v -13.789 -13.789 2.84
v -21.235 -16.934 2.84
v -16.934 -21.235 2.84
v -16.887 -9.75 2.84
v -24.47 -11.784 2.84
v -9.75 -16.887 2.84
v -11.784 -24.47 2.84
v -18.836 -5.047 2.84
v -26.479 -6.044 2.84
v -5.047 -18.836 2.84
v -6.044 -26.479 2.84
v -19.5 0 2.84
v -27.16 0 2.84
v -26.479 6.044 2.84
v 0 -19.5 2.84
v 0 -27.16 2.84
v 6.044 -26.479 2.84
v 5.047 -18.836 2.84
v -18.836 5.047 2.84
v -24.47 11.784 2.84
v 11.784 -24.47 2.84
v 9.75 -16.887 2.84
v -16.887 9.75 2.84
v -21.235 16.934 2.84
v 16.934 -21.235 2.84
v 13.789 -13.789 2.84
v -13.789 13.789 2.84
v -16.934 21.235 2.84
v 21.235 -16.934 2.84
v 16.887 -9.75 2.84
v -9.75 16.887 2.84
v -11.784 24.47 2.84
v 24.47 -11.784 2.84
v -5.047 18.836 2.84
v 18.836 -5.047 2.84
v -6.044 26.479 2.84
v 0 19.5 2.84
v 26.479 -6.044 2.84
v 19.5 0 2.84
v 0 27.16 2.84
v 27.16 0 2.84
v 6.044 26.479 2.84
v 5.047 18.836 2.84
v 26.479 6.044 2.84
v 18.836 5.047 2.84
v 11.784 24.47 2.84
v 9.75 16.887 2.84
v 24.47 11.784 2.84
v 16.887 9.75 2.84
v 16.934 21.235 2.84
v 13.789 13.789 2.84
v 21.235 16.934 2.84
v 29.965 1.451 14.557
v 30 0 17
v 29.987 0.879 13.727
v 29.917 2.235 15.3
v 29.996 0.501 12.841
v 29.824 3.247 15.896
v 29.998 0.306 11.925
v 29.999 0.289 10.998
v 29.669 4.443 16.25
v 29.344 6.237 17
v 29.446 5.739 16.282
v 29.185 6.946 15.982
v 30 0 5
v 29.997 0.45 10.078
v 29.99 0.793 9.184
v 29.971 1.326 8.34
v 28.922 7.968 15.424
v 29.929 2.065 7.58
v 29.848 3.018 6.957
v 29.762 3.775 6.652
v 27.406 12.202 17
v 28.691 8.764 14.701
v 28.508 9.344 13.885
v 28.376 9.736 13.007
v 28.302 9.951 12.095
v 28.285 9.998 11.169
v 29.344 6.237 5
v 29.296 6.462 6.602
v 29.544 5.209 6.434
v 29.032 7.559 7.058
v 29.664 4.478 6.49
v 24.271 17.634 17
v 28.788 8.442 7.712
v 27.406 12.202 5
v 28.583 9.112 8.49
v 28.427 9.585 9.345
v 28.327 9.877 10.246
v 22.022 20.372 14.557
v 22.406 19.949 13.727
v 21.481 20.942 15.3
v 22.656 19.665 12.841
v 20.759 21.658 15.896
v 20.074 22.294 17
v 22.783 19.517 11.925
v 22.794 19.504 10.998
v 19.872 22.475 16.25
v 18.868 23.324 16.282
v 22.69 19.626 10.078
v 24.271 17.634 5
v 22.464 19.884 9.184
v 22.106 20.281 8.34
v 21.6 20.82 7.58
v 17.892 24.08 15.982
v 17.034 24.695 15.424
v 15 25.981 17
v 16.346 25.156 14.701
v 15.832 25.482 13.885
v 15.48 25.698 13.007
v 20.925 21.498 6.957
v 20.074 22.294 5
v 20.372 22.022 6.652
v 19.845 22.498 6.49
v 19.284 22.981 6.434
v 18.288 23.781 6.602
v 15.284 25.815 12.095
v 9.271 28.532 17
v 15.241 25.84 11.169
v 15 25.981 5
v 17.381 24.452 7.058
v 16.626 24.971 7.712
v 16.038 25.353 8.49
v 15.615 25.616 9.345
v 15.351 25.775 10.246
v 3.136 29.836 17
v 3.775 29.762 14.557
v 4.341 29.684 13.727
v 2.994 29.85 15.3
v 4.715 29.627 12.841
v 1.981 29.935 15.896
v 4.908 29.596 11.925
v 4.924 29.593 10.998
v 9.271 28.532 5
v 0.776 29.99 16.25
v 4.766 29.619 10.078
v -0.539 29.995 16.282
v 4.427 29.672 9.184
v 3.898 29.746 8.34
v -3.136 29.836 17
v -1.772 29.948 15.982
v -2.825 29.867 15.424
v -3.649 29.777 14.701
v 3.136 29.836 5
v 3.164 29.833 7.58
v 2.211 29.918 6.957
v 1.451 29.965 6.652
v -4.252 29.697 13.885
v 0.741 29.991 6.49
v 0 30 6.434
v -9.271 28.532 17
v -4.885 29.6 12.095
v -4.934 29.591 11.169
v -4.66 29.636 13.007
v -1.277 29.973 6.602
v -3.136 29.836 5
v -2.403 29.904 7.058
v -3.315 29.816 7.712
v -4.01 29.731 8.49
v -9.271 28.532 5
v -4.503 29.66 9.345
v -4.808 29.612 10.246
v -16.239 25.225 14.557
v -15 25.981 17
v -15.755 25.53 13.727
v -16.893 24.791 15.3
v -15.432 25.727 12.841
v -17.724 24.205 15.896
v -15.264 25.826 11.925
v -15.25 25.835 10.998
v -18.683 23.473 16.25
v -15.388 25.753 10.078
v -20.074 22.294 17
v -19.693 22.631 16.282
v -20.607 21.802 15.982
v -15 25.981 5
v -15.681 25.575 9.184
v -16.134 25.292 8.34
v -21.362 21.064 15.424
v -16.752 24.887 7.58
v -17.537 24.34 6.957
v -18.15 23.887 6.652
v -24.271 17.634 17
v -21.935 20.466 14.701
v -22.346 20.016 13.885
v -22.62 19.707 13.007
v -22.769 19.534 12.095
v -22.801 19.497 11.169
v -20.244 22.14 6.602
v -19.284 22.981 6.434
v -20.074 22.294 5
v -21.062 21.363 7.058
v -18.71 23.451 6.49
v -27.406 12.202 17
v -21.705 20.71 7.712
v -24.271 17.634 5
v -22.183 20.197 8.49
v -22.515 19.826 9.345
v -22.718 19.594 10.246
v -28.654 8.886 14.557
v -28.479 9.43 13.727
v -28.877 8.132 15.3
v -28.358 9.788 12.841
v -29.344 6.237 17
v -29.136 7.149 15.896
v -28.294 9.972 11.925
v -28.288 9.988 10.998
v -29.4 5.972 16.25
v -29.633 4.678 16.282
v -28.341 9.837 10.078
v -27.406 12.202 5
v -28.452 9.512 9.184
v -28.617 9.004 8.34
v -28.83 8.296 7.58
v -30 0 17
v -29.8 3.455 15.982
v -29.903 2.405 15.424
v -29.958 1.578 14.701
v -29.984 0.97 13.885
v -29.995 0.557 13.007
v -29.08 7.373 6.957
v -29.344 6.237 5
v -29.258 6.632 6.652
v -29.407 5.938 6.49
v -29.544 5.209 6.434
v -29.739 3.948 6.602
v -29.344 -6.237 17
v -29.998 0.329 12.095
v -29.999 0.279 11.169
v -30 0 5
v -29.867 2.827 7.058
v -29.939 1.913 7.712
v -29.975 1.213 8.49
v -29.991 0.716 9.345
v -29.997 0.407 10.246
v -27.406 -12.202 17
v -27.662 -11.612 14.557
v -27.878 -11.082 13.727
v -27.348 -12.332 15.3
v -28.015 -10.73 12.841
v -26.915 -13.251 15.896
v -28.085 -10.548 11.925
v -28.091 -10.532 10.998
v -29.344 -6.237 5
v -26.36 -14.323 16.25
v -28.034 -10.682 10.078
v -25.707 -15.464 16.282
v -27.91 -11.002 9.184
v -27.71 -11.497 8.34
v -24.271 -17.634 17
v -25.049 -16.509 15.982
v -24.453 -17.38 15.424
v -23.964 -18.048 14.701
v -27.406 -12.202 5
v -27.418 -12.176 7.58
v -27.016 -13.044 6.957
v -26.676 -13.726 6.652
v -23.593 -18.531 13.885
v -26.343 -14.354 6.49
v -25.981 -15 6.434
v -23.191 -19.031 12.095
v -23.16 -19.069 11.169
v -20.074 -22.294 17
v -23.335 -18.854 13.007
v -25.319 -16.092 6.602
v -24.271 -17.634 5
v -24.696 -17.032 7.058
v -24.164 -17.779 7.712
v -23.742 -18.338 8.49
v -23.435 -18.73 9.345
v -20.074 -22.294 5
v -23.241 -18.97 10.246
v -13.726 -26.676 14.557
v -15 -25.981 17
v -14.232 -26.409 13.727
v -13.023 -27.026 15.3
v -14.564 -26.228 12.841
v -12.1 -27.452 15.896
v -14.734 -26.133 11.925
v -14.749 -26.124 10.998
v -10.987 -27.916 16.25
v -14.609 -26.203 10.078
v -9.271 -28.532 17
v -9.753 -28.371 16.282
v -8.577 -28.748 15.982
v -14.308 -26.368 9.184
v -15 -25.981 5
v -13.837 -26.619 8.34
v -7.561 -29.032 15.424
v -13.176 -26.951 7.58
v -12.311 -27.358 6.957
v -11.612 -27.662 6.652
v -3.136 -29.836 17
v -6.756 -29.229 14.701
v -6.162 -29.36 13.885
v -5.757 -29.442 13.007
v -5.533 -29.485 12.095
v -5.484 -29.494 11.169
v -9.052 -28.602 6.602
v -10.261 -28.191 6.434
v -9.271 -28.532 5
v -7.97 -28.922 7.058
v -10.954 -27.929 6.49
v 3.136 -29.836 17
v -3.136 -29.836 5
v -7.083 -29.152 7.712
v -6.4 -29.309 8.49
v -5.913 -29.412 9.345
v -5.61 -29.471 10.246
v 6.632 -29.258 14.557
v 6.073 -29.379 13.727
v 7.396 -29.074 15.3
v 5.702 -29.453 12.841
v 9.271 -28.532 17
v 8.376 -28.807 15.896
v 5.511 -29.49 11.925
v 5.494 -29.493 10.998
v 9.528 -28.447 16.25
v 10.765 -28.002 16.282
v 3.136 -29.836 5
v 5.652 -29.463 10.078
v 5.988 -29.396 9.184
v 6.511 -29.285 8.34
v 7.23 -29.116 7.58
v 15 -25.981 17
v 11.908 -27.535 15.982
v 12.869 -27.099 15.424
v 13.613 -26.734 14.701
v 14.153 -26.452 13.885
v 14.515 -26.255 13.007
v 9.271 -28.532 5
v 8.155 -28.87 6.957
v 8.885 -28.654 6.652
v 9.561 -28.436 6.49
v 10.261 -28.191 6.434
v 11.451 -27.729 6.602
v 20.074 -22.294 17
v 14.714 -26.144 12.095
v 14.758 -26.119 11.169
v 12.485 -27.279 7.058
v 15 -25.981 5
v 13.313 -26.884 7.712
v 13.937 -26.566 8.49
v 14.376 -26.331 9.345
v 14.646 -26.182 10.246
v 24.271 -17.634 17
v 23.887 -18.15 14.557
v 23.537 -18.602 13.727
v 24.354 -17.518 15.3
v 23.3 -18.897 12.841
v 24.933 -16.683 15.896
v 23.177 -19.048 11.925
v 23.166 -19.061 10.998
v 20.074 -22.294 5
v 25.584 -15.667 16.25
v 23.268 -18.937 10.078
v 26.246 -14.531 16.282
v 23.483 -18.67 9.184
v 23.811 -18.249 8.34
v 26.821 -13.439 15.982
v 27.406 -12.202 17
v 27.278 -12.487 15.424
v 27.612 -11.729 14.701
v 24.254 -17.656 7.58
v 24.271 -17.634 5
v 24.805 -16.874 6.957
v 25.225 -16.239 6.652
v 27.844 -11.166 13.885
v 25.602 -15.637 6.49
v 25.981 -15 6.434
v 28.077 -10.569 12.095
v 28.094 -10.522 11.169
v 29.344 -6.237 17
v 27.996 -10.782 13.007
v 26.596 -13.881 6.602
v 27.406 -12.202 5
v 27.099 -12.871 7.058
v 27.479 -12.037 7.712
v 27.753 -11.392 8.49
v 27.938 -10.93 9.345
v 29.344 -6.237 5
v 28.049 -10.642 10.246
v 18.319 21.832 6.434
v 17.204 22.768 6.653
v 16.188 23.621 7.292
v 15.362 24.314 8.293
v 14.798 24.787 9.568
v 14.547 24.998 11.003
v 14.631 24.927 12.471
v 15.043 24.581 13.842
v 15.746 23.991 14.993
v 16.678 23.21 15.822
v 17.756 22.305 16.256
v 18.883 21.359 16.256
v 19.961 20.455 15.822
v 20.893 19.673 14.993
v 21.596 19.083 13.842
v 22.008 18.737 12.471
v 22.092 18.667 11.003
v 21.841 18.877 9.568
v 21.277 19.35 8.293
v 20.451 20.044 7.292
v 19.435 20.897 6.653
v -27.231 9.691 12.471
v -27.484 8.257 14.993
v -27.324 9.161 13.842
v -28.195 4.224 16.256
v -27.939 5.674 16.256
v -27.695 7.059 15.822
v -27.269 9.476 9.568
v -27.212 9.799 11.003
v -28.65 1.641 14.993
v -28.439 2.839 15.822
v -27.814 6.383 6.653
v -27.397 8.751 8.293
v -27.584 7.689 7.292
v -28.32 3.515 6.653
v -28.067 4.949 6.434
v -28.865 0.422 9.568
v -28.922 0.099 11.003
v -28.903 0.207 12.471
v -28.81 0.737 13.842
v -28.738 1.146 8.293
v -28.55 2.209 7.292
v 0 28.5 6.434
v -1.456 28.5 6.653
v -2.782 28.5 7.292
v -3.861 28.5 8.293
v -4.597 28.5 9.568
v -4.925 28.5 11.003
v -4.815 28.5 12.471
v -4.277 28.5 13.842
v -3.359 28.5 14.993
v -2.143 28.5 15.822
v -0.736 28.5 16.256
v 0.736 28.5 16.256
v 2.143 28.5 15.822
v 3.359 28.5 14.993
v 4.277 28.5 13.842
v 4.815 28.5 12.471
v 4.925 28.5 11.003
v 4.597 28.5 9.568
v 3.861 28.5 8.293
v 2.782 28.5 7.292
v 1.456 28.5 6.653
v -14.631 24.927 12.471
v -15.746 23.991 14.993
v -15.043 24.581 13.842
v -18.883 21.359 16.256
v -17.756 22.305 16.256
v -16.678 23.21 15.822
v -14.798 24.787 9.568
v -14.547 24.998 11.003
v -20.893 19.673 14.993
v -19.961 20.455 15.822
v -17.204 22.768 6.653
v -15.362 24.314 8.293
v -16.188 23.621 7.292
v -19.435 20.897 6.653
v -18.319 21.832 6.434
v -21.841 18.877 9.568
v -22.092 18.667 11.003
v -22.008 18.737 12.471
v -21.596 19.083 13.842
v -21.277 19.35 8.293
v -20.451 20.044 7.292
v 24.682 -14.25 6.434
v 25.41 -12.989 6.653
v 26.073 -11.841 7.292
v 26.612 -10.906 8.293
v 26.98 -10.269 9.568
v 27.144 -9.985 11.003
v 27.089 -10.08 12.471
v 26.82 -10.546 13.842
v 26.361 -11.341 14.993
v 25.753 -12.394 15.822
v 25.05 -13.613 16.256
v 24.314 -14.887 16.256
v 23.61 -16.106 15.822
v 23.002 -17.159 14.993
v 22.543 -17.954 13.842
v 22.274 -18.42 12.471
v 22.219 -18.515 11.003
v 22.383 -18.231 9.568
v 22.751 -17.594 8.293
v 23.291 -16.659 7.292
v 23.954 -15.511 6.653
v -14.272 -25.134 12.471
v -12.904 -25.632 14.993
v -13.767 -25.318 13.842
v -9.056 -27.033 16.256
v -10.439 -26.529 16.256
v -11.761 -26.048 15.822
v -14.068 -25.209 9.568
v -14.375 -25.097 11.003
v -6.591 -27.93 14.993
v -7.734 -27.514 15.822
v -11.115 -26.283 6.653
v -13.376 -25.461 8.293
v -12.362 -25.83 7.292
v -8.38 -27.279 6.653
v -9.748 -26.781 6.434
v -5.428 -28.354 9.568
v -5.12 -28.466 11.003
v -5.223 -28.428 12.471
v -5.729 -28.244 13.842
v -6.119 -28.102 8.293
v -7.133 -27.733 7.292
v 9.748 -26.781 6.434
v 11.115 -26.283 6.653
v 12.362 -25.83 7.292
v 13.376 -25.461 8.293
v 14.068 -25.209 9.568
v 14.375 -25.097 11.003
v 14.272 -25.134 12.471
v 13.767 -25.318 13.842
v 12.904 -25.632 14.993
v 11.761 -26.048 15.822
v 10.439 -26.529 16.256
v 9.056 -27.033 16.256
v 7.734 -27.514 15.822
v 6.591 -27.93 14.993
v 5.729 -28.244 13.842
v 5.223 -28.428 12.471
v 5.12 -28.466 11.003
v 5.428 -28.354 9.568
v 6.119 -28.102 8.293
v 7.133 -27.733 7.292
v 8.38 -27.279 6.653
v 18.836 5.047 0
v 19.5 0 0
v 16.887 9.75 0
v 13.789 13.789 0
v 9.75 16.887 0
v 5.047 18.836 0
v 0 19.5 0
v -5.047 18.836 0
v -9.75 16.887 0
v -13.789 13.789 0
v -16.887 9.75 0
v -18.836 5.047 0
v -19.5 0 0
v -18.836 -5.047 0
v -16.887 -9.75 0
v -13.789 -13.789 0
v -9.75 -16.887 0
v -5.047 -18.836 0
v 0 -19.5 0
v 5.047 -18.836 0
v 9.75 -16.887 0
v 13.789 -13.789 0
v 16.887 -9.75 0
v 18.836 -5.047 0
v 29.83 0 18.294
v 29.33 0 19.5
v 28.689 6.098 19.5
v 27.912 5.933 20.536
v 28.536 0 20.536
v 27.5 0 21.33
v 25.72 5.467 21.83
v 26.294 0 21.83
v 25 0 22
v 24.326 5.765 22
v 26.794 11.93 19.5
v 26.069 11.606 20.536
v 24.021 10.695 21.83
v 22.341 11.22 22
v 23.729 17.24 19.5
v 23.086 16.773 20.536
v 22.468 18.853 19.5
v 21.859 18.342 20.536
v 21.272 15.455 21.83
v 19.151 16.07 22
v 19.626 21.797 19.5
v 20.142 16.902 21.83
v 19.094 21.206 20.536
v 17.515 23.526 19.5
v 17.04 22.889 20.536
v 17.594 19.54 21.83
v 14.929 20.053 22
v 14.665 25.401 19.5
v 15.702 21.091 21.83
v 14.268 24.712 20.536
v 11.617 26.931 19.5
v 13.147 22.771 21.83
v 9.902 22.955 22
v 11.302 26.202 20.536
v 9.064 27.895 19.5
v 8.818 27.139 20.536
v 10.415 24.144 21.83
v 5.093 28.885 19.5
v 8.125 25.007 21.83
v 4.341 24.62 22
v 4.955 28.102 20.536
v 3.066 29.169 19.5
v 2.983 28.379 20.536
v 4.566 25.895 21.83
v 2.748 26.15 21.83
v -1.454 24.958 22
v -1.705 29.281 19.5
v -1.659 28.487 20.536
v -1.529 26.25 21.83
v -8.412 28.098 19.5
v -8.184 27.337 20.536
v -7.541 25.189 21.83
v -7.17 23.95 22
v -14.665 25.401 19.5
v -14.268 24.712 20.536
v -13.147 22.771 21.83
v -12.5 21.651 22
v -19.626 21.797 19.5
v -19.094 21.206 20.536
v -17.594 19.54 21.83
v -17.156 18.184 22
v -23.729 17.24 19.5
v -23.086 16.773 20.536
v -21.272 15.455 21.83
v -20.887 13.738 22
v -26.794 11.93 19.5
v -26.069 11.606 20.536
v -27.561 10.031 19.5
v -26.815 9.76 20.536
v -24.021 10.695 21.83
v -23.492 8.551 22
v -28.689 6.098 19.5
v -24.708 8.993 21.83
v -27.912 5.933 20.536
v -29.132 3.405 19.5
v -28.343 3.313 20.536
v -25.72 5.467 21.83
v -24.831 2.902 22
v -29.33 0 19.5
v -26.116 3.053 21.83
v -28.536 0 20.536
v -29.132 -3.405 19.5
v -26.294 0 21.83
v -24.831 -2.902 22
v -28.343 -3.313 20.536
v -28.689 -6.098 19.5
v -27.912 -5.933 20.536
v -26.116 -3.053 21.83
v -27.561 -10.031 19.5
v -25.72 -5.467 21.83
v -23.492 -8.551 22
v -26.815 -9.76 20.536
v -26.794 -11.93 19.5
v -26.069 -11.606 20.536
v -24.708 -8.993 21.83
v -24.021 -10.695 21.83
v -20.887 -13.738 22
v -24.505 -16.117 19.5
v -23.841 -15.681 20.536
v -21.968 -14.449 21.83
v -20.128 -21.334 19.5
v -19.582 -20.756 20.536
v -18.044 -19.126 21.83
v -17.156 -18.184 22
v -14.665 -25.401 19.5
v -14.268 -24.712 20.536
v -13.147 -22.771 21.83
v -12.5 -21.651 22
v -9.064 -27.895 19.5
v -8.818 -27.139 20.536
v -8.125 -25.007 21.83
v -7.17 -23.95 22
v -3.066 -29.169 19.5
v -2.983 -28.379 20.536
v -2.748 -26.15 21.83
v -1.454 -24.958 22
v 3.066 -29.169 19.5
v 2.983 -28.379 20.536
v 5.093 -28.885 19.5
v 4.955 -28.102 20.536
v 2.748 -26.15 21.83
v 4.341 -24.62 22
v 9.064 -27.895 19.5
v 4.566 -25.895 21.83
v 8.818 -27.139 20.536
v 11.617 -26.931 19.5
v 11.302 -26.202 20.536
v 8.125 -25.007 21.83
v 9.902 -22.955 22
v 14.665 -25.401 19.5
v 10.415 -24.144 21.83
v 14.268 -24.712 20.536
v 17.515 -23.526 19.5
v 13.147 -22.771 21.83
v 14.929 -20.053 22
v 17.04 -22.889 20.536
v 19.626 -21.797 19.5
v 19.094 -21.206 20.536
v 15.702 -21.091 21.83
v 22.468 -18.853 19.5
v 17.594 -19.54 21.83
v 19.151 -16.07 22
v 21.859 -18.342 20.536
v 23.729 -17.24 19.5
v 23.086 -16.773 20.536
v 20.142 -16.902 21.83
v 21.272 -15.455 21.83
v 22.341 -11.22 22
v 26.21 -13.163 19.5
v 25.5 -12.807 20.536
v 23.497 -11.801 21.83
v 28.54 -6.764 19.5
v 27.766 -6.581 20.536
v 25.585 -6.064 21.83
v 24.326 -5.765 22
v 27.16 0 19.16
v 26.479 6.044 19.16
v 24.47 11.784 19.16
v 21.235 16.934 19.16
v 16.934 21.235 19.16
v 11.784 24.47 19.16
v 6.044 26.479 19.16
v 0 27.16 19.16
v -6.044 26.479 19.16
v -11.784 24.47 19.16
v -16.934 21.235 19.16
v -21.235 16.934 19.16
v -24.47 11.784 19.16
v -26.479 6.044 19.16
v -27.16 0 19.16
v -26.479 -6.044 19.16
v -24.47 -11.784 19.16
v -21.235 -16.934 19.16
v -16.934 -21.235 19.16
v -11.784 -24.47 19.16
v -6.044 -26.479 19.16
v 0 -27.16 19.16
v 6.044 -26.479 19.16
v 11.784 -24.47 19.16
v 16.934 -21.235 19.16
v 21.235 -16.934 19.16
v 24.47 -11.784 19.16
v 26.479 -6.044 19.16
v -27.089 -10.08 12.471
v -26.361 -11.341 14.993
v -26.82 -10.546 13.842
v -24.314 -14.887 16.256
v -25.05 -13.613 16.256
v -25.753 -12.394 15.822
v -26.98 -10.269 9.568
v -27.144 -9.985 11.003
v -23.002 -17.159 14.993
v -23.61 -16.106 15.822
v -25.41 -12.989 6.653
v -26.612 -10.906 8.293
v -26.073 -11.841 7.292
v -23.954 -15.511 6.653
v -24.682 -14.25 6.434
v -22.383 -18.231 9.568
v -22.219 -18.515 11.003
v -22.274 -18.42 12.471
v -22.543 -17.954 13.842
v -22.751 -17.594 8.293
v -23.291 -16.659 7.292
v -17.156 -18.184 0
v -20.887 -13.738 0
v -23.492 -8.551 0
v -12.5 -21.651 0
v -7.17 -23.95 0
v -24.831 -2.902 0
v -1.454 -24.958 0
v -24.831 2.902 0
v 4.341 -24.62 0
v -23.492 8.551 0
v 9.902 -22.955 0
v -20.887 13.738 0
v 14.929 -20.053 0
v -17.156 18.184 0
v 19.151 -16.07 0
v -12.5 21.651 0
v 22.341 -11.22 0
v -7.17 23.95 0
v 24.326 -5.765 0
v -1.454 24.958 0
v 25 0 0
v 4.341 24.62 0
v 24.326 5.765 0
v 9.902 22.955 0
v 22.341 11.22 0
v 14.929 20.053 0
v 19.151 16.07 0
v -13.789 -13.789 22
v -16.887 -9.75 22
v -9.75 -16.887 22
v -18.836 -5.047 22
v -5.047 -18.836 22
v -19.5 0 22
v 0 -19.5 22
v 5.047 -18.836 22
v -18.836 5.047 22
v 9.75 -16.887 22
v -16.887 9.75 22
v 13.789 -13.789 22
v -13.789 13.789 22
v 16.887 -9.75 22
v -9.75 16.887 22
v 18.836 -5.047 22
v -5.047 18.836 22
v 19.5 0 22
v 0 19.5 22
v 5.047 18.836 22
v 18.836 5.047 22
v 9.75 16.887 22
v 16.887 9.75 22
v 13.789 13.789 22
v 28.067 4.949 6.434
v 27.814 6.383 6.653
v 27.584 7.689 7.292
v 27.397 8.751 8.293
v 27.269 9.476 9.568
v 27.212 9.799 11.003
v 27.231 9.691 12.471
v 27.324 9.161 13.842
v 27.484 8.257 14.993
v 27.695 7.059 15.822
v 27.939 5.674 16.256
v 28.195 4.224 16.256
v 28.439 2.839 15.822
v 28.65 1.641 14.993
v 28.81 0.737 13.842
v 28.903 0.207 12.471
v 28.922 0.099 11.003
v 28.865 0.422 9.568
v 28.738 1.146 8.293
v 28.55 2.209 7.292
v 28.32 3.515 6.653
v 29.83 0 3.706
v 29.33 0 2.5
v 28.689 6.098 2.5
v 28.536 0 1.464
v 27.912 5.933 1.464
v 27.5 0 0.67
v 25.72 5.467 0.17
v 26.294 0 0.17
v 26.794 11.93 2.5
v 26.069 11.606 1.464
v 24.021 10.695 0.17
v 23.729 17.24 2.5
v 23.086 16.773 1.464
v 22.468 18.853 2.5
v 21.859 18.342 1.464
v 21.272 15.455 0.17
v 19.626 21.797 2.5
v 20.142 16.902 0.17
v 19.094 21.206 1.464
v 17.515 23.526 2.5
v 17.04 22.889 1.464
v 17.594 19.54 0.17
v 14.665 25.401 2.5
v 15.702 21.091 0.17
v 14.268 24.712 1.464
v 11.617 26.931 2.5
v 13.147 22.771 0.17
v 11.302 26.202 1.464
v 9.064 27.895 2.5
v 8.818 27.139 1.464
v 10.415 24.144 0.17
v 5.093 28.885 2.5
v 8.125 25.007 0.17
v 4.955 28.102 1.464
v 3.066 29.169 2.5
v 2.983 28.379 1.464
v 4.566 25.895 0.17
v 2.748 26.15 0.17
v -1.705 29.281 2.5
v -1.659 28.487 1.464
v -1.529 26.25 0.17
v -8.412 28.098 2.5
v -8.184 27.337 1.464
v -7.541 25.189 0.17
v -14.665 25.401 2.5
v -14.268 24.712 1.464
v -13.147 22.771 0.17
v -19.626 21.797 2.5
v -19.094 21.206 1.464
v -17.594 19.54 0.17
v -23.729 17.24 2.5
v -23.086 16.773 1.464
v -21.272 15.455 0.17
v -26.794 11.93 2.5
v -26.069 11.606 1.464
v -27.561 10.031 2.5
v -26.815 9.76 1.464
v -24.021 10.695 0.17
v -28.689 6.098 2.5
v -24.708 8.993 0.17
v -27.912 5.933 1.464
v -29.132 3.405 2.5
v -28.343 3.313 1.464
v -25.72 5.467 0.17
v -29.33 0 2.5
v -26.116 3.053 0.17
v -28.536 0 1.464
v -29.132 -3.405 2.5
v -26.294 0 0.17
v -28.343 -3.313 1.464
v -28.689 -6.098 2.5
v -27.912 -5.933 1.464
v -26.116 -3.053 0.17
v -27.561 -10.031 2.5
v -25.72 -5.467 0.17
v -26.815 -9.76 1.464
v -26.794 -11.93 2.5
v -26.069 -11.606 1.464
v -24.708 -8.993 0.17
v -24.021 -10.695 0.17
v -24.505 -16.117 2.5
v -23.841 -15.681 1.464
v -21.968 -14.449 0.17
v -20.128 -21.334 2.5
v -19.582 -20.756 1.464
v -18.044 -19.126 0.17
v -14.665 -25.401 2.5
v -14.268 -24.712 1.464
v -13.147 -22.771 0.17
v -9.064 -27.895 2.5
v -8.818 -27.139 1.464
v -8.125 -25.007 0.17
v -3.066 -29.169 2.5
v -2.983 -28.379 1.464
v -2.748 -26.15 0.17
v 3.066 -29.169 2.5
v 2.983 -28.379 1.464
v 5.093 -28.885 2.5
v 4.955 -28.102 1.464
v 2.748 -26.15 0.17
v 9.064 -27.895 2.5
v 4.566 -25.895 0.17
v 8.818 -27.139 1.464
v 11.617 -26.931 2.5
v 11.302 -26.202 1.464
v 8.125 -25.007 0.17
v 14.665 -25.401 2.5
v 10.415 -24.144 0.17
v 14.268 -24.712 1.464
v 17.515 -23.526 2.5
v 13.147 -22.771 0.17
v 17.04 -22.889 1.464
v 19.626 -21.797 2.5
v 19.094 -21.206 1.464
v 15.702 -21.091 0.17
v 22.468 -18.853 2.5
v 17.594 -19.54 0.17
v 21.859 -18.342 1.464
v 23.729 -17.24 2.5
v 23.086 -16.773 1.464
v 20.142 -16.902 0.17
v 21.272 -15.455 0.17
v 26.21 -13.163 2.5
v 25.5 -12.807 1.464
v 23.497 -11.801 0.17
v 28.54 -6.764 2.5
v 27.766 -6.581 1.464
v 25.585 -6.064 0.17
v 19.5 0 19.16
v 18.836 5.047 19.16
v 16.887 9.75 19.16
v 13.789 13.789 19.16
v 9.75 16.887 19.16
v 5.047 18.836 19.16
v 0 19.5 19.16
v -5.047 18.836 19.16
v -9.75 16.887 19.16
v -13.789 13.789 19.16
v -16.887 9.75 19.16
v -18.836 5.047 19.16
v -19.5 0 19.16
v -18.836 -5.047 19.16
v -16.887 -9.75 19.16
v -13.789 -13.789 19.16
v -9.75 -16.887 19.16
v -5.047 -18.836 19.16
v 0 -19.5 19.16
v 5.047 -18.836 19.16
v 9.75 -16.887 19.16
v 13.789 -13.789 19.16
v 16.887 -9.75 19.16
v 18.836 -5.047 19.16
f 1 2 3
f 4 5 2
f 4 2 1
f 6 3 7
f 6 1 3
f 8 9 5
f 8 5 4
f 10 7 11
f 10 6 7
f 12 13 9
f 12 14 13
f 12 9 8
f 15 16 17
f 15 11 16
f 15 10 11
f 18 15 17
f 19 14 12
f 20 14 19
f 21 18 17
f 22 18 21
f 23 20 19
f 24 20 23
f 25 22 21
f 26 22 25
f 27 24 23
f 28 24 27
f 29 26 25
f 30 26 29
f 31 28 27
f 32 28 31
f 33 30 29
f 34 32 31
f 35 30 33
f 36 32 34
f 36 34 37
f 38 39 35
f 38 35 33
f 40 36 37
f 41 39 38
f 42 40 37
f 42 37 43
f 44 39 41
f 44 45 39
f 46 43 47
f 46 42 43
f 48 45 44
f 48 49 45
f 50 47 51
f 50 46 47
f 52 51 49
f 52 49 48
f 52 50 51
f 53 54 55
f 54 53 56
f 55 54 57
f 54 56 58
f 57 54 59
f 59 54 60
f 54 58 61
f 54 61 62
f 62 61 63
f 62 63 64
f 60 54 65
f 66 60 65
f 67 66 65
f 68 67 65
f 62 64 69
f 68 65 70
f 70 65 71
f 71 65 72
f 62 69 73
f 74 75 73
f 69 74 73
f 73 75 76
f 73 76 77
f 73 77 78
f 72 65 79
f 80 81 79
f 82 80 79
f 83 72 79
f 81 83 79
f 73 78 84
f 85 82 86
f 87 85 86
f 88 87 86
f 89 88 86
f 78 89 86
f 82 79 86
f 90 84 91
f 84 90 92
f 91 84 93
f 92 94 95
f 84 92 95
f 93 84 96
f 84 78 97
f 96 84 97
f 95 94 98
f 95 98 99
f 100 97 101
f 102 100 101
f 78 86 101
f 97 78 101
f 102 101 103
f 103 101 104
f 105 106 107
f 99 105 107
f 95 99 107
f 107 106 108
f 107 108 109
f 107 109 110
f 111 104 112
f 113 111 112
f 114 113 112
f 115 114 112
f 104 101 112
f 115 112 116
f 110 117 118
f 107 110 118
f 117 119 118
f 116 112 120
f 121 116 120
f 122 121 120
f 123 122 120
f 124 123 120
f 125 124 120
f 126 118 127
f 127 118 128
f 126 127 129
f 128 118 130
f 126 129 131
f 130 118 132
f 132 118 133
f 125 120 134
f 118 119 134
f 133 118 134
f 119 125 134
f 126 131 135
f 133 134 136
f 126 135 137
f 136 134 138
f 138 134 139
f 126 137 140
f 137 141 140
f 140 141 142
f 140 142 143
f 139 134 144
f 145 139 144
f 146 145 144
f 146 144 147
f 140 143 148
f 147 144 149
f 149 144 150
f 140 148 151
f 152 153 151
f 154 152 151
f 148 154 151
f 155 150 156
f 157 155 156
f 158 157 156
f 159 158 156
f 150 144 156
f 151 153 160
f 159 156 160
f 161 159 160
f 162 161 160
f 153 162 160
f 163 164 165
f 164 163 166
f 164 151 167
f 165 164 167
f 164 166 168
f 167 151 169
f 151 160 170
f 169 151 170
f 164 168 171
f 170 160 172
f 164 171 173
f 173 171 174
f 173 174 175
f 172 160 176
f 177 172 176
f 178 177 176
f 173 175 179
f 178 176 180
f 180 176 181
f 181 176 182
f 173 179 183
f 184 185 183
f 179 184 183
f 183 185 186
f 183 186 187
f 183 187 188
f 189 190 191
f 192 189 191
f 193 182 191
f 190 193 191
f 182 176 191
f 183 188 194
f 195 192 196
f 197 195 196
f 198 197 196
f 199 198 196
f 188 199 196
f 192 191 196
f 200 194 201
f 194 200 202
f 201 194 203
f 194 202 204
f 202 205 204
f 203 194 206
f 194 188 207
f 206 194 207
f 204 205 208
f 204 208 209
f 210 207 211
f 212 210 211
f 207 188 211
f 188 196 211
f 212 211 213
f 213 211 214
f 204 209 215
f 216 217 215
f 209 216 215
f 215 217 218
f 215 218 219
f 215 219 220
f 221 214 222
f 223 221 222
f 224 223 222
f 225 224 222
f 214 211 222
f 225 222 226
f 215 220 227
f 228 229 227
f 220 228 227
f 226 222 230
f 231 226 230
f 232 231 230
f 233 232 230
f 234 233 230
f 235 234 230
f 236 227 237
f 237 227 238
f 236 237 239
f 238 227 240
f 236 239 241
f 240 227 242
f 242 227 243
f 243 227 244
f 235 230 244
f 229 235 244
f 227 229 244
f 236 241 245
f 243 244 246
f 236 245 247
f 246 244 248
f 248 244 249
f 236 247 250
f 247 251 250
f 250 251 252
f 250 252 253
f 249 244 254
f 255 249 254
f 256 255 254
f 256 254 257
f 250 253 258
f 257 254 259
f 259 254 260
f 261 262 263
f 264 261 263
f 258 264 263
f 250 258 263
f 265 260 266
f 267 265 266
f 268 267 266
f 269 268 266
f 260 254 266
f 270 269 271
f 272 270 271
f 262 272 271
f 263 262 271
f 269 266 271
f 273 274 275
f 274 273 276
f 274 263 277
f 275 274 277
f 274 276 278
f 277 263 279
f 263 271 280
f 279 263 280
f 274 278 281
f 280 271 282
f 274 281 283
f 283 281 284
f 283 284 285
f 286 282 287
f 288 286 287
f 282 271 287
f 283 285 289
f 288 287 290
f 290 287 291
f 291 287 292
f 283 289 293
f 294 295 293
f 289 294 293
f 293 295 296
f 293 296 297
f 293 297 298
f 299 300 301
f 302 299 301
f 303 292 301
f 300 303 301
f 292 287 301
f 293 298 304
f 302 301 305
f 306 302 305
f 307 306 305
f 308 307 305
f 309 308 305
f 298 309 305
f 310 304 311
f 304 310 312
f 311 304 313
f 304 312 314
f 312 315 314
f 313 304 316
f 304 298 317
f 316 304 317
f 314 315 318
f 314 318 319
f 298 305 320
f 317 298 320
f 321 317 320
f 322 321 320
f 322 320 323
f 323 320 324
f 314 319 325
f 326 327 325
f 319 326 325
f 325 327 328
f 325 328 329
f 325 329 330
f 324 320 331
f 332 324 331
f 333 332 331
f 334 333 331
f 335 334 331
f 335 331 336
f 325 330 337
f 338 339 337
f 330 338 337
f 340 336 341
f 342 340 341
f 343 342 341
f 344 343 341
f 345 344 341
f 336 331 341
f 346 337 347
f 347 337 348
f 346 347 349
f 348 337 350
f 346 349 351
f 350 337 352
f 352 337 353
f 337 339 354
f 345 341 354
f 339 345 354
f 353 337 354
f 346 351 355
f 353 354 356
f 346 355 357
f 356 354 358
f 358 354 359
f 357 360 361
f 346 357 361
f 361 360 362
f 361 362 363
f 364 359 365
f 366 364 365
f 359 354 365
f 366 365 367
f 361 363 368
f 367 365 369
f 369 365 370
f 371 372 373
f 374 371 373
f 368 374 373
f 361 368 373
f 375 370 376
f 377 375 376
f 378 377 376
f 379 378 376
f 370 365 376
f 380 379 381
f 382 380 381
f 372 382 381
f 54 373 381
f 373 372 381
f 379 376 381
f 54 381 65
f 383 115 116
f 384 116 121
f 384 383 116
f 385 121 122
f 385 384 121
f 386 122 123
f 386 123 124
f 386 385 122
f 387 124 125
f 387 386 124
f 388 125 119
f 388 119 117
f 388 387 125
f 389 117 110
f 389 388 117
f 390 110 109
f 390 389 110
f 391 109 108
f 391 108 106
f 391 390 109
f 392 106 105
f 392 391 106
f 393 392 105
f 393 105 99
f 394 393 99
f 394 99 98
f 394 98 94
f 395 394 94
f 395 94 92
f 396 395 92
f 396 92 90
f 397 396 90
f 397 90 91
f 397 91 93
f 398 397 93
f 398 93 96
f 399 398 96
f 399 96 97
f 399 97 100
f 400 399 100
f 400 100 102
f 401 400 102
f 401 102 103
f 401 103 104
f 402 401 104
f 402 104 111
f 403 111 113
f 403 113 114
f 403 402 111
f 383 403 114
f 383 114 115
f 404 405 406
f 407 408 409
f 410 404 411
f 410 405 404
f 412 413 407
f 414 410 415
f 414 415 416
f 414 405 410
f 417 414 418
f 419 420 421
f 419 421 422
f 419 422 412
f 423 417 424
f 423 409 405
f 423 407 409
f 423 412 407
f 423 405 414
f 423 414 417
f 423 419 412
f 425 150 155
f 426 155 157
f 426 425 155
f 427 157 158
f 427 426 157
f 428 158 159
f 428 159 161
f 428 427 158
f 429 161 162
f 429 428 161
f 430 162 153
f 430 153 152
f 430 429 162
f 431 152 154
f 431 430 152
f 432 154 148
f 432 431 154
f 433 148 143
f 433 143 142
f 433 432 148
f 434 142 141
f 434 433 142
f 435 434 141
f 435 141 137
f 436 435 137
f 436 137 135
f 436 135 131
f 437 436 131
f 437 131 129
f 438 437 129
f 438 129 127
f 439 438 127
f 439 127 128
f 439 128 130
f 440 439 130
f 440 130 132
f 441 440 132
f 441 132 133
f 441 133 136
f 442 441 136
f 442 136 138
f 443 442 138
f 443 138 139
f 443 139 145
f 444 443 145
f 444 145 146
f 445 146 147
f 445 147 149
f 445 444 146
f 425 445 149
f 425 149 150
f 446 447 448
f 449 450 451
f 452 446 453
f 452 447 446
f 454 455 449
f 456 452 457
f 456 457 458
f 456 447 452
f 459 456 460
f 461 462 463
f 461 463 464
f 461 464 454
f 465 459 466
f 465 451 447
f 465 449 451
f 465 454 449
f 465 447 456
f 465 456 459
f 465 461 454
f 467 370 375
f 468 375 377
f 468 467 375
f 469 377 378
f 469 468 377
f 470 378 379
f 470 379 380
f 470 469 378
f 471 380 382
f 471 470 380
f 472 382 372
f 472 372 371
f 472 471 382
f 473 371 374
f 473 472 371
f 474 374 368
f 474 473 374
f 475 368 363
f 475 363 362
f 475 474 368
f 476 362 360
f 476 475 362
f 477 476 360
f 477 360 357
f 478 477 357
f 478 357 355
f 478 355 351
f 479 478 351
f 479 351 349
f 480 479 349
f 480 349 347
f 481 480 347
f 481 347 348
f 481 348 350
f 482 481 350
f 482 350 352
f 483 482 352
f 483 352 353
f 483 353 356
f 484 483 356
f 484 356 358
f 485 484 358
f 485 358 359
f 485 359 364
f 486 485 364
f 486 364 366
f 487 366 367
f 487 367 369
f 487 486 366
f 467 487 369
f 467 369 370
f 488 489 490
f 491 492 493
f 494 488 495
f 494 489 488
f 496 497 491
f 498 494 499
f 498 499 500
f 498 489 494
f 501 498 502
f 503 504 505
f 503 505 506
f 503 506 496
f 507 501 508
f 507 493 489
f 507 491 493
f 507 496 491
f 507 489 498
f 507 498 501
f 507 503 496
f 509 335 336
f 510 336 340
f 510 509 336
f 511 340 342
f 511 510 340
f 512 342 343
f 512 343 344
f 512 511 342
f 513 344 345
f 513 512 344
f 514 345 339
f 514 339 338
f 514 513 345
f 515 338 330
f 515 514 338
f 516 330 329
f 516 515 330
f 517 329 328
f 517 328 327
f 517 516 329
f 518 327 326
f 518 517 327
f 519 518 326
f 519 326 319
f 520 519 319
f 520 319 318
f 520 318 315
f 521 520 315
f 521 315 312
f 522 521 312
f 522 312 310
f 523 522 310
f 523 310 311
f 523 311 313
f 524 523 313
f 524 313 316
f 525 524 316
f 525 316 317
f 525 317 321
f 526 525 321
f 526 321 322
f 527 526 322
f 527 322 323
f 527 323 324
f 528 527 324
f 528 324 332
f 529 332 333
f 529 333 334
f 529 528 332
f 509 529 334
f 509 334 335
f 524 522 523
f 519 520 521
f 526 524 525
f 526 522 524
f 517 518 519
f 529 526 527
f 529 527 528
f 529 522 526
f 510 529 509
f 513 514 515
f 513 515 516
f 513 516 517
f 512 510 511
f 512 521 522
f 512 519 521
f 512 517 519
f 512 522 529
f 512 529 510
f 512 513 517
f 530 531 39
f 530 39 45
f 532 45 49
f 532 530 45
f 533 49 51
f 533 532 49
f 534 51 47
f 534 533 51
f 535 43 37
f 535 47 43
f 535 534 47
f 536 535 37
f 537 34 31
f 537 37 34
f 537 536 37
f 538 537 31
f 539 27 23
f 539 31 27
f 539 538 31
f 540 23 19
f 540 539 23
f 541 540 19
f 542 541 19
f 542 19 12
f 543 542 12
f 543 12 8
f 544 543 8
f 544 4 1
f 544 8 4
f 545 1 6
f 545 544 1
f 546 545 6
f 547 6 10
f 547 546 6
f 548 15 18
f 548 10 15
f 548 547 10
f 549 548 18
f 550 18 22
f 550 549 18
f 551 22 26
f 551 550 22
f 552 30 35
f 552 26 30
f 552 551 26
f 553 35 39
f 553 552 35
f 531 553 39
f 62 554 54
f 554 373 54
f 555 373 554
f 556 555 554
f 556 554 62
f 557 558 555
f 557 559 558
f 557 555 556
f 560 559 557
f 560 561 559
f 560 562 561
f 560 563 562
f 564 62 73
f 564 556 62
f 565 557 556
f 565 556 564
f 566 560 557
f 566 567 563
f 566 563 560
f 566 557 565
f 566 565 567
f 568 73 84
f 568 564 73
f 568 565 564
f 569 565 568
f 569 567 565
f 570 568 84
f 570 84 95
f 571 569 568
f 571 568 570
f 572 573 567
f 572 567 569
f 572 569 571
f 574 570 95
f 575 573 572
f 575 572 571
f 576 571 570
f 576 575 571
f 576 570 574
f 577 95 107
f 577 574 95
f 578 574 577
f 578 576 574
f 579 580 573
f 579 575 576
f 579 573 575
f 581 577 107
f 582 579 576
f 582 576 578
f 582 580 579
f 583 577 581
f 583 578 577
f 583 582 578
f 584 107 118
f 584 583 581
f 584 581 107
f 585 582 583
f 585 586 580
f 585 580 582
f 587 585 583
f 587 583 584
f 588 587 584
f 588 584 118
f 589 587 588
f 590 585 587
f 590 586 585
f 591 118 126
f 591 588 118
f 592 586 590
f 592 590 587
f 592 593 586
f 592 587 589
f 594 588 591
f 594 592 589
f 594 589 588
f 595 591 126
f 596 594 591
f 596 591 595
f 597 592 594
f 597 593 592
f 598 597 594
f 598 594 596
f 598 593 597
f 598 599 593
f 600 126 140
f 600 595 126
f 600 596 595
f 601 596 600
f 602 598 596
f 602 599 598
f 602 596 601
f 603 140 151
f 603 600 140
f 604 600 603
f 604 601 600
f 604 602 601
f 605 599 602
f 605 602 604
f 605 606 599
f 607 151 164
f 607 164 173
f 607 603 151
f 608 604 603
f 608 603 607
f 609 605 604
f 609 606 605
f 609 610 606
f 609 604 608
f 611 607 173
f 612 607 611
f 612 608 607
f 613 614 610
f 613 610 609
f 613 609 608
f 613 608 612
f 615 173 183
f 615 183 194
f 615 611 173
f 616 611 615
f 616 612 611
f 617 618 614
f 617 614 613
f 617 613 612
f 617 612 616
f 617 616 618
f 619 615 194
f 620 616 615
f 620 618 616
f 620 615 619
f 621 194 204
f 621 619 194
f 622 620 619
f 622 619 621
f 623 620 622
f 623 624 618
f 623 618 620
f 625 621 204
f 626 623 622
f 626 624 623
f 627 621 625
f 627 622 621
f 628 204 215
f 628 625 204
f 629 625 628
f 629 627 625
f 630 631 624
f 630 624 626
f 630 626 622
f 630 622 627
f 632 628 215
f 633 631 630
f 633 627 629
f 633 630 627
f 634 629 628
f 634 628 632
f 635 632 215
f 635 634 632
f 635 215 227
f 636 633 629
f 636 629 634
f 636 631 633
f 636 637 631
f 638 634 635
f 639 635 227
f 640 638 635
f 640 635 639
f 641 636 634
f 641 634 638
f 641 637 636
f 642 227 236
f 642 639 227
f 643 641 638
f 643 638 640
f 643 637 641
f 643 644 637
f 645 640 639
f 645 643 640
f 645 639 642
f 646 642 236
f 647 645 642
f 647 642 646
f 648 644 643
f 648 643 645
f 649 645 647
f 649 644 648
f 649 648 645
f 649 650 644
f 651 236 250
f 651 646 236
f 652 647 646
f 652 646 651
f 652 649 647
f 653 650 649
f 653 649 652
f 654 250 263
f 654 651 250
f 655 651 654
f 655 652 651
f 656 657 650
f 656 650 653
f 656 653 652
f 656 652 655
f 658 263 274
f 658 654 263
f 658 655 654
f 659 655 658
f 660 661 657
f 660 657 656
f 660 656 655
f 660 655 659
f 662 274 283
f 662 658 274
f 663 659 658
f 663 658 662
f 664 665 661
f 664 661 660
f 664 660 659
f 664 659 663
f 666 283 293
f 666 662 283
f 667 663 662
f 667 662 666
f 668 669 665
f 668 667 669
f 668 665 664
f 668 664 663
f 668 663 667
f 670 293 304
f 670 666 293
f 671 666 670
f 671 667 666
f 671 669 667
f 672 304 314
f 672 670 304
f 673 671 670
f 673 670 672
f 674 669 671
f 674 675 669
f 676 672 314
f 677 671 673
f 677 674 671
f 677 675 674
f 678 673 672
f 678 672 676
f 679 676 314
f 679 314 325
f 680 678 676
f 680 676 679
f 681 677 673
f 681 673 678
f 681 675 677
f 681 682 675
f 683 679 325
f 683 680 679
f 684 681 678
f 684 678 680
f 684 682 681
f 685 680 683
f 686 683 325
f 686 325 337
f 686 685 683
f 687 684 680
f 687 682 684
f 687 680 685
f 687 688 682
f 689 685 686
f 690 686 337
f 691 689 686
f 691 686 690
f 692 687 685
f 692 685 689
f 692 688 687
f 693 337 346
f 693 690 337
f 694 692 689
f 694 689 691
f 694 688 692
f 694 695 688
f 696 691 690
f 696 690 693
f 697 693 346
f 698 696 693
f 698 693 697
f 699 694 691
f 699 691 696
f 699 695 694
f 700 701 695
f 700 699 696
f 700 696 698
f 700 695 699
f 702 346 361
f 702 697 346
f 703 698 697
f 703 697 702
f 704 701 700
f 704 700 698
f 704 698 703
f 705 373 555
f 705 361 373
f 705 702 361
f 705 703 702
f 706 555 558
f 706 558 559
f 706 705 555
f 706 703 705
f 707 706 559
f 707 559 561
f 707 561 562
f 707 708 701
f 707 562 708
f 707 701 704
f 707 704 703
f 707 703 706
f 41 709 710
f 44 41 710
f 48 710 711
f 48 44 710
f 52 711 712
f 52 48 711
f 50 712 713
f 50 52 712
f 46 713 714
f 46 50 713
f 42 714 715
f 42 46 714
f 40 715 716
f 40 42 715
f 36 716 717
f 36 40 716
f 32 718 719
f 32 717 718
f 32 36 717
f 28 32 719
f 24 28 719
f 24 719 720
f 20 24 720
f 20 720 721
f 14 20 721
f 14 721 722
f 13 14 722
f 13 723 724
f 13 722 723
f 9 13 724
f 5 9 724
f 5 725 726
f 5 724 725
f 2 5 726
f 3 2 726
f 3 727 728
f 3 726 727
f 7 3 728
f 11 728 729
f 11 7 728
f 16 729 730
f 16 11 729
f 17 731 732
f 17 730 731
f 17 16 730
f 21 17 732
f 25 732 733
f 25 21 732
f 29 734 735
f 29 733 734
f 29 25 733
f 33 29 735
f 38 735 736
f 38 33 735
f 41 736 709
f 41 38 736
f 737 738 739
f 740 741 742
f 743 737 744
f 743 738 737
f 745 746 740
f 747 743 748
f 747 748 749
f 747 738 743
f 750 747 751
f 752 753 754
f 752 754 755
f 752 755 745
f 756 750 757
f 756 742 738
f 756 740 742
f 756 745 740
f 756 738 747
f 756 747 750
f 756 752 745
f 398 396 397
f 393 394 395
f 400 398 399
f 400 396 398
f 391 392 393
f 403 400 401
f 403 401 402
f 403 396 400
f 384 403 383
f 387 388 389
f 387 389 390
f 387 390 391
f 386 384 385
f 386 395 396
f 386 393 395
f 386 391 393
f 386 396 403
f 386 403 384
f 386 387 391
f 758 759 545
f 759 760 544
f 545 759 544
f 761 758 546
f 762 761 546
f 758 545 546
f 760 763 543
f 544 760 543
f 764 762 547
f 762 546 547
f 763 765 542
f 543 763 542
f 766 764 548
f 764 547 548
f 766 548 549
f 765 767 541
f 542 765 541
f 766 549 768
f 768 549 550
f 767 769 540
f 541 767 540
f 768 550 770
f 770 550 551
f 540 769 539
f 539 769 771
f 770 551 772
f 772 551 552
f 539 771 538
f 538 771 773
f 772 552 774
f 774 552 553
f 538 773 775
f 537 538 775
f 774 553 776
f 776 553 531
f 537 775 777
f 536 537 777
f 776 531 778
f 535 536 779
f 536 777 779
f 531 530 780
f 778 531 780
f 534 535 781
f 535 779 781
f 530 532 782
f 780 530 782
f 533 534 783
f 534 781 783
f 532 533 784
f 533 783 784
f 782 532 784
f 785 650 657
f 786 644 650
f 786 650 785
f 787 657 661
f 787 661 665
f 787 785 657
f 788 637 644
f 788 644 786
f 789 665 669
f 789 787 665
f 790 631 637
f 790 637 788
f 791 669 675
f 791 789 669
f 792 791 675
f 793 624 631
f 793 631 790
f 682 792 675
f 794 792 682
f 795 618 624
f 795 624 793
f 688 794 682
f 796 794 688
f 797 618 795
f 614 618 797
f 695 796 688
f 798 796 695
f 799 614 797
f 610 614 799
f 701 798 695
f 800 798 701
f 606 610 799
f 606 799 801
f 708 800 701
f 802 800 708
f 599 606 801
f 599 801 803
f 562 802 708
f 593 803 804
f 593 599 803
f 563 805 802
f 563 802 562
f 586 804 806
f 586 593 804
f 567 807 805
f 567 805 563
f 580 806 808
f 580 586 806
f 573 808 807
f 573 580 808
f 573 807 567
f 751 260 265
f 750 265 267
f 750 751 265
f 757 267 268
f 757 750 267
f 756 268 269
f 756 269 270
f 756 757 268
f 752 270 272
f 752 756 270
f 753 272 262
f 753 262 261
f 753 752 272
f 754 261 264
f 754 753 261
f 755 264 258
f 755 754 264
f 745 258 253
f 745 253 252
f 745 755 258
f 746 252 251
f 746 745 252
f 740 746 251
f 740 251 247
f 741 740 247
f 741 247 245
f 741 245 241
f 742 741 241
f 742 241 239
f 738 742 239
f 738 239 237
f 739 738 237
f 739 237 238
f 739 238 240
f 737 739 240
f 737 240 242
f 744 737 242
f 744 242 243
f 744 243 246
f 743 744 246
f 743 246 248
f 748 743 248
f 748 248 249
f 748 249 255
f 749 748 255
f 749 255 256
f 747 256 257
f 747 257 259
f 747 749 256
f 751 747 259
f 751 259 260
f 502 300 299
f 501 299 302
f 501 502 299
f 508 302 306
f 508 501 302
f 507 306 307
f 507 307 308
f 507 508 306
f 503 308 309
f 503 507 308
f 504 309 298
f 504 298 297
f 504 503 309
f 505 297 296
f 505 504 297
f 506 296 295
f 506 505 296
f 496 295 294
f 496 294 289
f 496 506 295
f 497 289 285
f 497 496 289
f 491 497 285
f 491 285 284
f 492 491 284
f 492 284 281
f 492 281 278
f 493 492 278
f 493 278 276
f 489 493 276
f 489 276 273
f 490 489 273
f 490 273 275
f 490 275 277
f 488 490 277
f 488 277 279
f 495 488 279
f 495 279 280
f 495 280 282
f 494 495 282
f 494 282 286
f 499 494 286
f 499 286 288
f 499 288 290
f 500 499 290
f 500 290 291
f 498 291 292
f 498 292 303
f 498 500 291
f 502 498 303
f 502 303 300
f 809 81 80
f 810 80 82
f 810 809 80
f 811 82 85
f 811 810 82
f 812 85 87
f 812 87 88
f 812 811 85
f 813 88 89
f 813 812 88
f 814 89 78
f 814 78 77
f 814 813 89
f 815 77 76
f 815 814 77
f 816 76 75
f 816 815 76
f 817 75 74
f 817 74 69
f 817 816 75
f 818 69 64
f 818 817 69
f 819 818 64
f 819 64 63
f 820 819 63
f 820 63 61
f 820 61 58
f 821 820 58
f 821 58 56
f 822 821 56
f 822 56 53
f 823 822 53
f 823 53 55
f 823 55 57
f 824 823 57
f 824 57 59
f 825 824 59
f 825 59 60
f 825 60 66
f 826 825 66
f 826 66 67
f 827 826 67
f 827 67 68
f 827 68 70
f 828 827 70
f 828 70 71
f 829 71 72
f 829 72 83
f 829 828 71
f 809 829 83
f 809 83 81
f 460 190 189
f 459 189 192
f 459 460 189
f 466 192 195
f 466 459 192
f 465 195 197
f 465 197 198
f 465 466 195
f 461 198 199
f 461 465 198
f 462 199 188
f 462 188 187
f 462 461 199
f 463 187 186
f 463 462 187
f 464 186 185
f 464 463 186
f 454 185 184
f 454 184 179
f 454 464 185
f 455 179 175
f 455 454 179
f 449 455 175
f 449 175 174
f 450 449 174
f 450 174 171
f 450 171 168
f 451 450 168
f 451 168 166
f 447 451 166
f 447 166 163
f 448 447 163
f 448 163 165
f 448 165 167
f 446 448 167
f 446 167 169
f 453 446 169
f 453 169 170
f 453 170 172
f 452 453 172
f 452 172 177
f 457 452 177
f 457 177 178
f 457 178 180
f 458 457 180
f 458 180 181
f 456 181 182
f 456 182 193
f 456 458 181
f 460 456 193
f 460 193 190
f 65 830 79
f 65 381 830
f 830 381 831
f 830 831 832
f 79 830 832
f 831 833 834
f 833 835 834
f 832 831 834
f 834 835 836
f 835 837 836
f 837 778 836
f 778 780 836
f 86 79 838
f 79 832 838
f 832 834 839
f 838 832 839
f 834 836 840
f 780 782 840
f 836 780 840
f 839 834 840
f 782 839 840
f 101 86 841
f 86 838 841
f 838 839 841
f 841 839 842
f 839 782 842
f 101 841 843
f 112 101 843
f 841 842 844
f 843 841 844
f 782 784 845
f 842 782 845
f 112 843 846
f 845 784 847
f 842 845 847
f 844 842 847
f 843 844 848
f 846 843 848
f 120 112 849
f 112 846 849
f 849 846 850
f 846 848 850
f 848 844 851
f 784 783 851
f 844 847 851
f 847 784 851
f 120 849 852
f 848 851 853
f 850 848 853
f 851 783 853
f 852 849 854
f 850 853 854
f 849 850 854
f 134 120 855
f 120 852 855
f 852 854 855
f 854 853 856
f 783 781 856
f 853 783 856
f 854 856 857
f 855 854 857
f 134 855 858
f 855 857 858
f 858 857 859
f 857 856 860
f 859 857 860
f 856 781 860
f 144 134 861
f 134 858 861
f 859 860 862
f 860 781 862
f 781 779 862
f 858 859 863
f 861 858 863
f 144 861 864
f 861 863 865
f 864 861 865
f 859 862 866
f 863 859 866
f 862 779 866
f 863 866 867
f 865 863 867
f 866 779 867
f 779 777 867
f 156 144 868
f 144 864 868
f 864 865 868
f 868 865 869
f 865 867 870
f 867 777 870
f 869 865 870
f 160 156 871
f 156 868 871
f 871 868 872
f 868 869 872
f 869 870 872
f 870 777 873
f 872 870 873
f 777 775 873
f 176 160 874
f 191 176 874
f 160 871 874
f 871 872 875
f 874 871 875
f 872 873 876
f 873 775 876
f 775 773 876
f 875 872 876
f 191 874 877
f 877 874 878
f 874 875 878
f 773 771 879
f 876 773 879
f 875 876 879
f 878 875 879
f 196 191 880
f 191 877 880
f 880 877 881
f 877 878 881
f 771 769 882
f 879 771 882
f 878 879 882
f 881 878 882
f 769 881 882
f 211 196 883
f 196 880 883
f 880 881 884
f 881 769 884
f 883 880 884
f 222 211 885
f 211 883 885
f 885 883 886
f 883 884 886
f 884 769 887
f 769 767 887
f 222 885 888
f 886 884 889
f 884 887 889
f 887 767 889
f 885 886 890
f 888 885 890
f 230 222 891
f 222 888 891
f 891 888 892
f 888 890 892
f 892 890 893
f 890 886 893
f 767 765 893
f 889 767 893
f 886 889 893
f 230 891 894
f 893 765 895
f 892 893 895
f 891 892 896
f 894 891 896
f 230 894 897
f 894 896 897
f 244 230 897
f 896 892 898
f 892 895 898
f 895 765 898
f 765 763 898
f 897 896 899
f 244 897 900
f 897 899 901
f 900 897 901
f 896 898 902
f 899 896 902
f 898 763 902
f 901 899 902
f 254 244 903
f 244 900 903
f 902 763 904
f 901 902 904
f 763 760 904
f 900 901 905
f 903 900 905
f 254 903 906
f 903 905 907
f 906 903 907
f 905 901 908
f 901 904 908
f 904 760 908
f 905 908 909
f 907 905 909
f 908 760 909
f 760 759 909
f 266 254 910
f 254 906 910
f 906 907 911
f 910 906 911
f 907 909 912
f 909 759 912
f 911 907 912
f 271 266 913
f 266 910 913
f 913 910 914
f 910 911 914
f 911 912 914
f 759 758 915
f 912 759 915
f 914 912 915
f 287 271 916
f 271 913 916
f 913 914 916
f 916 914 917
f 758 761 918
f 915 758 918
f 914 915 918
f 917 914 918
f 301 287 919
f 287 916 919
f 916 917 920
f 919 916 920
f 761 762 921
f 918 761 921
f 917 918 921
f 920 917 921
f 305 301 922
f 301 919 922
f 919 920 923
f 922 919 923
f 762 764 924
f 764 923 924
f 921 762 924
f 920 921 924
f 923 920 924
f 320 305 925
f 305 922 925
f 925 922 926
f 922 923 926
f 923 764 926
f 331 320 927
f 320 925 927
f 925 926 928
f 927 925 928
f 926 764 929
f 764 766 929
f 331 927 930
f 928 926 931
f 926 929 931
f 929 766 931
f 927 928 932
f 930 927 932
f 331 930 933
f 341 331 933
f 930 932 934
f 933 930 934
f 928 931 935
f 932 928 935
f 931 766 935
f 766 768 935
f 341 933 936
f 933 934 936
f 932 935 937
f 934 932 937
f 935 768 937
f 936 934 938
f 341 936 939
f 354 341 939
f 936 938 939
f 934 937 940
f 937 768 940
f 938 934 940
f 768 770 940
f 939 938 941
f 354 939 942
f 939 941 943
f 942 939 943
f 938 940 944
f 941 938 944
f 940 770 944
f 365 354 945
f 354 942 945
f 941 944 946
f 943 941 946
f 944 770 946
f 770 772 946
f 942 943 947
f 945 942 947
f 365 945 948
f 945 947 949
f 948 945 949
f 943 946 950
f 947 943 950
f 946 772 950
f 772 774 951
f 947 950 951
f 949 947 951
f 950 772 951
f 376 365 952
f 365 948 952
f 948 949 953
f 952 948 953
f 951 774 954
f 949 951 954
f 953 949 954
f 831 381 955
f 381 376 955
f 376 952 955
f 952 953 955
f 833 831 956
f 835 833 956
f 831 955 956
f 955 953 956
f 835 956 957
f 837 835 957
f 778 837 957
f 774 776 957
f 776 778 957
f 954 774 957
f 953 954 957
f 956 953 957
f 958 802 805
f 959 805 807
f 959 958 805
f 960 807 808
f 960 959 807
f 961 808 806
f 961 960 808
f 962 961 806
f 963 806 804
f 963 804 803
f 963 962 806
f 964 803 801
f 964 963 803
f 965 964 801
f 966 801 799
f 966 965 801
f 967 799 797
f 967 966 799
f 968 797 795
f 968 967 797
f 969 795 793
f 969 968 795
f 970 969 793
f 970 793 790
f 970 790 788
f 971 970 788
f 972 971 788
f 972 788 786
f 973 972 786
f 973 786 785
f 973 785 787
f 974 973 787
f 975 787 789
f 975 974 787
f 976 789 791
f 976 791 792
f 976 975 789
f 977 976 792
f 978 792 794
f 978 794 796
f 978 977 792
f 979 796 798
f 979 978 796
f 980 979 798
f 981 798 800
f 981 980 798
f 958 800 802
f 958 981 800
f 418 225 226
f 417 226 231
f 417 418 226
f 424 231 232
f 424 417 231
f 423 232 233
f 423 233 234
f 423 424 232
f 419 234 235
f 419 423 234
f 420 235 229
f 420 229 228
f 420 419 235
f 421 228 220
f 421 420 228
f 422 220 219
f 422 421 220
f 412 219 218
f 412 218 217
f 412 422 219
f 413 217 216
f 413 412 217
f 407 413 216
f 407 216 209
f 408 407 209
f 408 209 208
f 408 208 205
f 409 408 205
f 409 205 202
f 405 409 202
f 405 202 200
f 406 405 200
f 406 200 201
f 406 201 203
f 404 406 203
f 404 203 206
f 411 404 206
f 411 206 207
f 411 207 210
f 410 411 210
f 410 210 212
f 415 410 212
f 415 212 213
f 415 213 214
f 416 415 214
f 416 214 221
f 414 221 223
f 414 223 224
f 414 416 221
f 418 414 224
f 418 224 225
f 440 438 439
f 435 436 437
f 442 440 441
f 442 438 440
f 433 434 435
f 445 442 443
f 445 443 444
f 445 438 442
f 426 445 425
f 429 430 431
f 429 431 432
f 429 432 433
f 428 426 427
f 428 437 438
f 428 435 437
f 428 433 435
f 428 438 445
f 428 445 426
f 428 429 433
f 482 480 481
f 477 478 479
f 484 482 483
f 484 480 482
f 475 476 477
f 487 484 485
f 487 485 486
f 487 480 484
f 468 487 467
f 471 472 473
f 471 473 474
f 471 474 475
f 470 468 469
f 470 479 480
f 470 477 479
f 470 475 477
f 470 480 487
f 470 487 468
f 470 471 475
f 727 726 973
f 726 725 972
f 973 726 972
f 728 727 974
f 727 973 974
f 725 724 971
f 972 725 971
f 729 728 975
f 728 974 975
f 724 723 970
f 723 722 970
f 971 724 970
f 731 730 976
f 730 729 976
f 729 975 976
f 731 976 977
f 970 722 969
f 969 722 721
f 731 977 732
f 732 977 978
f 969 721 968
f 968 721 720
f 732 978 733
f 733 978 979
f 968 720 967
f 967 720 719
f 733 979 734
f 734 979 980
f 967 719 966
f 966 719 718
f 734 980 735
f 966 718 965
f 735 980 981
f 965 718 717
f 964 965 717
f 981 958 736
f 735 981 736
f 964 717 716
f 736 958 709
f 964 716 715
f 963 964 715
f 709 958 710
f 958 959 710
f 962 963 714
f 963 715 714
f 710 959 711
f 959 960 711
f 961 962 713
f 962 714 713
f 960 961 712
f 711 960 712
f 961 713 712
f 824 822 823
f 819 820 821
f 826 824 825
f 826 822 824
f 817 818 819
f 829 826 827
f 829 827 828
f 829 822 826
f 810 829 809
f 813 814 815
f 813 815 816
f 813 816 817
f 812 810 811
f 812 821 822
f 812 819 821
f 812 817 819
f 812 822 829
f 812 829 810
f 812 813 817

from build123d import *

# Parameters (mm, degrees)
SKETCH5_R           = 30
BOSS_EXTRUDE2_DEPTH = 22
SKETCH6_R           = 19.5
CUT_EXTRUDE3_DEPTH  = 22
SHELL4_T            = -2.84
FILLET2_R           = 5
SKETCH7_R           = 4.938582487
CUT_EXTRUDE4_DEPTH  = 22
CIRPATTERN1_COUNT   = 9


with BuildPart() as part:
    # Sketch5 → Boss-Extrude2 (new body)
    with BuildSketch(Plane.XY):
        Circle(SKETCH5_R)
    extrude(amount=BOSS_EXTRUDE2_DEPTH)

    # Sketch6 → Cut-Extrude3 (cut)
    with BuildSketch(Plane.XY):
        Circle(SKETCH6_R)
    extrude(amount=CUT_EXTRUDE3_DEPTH, mode=Mode.SUBTRACT)

    # Shell4
    shell4_openings = [part.faces().sort_by_distance(p)[0] for p in [
        (-19.5, 0, 11),
    ]]
    offset(amount=SHELL4_T, openings=shell4_openings, kind=Kind.INTERSECTION)

    # Fillet2
    fillet2_edges = [part.edges().sort_by_distance(p)[0] for p in [
        (-30, 0, 0),
        (-30, 0, 22),
    ]]
    fillet(fillet2_edges, radius=FILLET2_R)

    # Sketch7 → Cut-Extrude4 (cut)
    with BuildSketch(Plane(origin=(0, 28.5, 0), x_dir=(1, 0, 0), z_dir=(0, 1, 0))):
        with Locations((0, -11.372504627)):
            Circle(SKETCH7_R)
    cut_extrude4 = extrude(amount=CUT_EXTRUDE4_DEPTH, mode=Mode.SUBTRACT)

    # CirPattern1: Cut-Extrude4 ×9 about axis
    cirpattern1_axis = Axis((0, 0, 23.1), (0, 0, -1))
    for i in range(1, CIRPATTERN1_COUNT):
        add(cut_extrude4.rotate(cirpattern1_axis, i * 360 / CIRPATTERN1_COUNT), mode=Mode.SUBTRACT)


solid = part.part
